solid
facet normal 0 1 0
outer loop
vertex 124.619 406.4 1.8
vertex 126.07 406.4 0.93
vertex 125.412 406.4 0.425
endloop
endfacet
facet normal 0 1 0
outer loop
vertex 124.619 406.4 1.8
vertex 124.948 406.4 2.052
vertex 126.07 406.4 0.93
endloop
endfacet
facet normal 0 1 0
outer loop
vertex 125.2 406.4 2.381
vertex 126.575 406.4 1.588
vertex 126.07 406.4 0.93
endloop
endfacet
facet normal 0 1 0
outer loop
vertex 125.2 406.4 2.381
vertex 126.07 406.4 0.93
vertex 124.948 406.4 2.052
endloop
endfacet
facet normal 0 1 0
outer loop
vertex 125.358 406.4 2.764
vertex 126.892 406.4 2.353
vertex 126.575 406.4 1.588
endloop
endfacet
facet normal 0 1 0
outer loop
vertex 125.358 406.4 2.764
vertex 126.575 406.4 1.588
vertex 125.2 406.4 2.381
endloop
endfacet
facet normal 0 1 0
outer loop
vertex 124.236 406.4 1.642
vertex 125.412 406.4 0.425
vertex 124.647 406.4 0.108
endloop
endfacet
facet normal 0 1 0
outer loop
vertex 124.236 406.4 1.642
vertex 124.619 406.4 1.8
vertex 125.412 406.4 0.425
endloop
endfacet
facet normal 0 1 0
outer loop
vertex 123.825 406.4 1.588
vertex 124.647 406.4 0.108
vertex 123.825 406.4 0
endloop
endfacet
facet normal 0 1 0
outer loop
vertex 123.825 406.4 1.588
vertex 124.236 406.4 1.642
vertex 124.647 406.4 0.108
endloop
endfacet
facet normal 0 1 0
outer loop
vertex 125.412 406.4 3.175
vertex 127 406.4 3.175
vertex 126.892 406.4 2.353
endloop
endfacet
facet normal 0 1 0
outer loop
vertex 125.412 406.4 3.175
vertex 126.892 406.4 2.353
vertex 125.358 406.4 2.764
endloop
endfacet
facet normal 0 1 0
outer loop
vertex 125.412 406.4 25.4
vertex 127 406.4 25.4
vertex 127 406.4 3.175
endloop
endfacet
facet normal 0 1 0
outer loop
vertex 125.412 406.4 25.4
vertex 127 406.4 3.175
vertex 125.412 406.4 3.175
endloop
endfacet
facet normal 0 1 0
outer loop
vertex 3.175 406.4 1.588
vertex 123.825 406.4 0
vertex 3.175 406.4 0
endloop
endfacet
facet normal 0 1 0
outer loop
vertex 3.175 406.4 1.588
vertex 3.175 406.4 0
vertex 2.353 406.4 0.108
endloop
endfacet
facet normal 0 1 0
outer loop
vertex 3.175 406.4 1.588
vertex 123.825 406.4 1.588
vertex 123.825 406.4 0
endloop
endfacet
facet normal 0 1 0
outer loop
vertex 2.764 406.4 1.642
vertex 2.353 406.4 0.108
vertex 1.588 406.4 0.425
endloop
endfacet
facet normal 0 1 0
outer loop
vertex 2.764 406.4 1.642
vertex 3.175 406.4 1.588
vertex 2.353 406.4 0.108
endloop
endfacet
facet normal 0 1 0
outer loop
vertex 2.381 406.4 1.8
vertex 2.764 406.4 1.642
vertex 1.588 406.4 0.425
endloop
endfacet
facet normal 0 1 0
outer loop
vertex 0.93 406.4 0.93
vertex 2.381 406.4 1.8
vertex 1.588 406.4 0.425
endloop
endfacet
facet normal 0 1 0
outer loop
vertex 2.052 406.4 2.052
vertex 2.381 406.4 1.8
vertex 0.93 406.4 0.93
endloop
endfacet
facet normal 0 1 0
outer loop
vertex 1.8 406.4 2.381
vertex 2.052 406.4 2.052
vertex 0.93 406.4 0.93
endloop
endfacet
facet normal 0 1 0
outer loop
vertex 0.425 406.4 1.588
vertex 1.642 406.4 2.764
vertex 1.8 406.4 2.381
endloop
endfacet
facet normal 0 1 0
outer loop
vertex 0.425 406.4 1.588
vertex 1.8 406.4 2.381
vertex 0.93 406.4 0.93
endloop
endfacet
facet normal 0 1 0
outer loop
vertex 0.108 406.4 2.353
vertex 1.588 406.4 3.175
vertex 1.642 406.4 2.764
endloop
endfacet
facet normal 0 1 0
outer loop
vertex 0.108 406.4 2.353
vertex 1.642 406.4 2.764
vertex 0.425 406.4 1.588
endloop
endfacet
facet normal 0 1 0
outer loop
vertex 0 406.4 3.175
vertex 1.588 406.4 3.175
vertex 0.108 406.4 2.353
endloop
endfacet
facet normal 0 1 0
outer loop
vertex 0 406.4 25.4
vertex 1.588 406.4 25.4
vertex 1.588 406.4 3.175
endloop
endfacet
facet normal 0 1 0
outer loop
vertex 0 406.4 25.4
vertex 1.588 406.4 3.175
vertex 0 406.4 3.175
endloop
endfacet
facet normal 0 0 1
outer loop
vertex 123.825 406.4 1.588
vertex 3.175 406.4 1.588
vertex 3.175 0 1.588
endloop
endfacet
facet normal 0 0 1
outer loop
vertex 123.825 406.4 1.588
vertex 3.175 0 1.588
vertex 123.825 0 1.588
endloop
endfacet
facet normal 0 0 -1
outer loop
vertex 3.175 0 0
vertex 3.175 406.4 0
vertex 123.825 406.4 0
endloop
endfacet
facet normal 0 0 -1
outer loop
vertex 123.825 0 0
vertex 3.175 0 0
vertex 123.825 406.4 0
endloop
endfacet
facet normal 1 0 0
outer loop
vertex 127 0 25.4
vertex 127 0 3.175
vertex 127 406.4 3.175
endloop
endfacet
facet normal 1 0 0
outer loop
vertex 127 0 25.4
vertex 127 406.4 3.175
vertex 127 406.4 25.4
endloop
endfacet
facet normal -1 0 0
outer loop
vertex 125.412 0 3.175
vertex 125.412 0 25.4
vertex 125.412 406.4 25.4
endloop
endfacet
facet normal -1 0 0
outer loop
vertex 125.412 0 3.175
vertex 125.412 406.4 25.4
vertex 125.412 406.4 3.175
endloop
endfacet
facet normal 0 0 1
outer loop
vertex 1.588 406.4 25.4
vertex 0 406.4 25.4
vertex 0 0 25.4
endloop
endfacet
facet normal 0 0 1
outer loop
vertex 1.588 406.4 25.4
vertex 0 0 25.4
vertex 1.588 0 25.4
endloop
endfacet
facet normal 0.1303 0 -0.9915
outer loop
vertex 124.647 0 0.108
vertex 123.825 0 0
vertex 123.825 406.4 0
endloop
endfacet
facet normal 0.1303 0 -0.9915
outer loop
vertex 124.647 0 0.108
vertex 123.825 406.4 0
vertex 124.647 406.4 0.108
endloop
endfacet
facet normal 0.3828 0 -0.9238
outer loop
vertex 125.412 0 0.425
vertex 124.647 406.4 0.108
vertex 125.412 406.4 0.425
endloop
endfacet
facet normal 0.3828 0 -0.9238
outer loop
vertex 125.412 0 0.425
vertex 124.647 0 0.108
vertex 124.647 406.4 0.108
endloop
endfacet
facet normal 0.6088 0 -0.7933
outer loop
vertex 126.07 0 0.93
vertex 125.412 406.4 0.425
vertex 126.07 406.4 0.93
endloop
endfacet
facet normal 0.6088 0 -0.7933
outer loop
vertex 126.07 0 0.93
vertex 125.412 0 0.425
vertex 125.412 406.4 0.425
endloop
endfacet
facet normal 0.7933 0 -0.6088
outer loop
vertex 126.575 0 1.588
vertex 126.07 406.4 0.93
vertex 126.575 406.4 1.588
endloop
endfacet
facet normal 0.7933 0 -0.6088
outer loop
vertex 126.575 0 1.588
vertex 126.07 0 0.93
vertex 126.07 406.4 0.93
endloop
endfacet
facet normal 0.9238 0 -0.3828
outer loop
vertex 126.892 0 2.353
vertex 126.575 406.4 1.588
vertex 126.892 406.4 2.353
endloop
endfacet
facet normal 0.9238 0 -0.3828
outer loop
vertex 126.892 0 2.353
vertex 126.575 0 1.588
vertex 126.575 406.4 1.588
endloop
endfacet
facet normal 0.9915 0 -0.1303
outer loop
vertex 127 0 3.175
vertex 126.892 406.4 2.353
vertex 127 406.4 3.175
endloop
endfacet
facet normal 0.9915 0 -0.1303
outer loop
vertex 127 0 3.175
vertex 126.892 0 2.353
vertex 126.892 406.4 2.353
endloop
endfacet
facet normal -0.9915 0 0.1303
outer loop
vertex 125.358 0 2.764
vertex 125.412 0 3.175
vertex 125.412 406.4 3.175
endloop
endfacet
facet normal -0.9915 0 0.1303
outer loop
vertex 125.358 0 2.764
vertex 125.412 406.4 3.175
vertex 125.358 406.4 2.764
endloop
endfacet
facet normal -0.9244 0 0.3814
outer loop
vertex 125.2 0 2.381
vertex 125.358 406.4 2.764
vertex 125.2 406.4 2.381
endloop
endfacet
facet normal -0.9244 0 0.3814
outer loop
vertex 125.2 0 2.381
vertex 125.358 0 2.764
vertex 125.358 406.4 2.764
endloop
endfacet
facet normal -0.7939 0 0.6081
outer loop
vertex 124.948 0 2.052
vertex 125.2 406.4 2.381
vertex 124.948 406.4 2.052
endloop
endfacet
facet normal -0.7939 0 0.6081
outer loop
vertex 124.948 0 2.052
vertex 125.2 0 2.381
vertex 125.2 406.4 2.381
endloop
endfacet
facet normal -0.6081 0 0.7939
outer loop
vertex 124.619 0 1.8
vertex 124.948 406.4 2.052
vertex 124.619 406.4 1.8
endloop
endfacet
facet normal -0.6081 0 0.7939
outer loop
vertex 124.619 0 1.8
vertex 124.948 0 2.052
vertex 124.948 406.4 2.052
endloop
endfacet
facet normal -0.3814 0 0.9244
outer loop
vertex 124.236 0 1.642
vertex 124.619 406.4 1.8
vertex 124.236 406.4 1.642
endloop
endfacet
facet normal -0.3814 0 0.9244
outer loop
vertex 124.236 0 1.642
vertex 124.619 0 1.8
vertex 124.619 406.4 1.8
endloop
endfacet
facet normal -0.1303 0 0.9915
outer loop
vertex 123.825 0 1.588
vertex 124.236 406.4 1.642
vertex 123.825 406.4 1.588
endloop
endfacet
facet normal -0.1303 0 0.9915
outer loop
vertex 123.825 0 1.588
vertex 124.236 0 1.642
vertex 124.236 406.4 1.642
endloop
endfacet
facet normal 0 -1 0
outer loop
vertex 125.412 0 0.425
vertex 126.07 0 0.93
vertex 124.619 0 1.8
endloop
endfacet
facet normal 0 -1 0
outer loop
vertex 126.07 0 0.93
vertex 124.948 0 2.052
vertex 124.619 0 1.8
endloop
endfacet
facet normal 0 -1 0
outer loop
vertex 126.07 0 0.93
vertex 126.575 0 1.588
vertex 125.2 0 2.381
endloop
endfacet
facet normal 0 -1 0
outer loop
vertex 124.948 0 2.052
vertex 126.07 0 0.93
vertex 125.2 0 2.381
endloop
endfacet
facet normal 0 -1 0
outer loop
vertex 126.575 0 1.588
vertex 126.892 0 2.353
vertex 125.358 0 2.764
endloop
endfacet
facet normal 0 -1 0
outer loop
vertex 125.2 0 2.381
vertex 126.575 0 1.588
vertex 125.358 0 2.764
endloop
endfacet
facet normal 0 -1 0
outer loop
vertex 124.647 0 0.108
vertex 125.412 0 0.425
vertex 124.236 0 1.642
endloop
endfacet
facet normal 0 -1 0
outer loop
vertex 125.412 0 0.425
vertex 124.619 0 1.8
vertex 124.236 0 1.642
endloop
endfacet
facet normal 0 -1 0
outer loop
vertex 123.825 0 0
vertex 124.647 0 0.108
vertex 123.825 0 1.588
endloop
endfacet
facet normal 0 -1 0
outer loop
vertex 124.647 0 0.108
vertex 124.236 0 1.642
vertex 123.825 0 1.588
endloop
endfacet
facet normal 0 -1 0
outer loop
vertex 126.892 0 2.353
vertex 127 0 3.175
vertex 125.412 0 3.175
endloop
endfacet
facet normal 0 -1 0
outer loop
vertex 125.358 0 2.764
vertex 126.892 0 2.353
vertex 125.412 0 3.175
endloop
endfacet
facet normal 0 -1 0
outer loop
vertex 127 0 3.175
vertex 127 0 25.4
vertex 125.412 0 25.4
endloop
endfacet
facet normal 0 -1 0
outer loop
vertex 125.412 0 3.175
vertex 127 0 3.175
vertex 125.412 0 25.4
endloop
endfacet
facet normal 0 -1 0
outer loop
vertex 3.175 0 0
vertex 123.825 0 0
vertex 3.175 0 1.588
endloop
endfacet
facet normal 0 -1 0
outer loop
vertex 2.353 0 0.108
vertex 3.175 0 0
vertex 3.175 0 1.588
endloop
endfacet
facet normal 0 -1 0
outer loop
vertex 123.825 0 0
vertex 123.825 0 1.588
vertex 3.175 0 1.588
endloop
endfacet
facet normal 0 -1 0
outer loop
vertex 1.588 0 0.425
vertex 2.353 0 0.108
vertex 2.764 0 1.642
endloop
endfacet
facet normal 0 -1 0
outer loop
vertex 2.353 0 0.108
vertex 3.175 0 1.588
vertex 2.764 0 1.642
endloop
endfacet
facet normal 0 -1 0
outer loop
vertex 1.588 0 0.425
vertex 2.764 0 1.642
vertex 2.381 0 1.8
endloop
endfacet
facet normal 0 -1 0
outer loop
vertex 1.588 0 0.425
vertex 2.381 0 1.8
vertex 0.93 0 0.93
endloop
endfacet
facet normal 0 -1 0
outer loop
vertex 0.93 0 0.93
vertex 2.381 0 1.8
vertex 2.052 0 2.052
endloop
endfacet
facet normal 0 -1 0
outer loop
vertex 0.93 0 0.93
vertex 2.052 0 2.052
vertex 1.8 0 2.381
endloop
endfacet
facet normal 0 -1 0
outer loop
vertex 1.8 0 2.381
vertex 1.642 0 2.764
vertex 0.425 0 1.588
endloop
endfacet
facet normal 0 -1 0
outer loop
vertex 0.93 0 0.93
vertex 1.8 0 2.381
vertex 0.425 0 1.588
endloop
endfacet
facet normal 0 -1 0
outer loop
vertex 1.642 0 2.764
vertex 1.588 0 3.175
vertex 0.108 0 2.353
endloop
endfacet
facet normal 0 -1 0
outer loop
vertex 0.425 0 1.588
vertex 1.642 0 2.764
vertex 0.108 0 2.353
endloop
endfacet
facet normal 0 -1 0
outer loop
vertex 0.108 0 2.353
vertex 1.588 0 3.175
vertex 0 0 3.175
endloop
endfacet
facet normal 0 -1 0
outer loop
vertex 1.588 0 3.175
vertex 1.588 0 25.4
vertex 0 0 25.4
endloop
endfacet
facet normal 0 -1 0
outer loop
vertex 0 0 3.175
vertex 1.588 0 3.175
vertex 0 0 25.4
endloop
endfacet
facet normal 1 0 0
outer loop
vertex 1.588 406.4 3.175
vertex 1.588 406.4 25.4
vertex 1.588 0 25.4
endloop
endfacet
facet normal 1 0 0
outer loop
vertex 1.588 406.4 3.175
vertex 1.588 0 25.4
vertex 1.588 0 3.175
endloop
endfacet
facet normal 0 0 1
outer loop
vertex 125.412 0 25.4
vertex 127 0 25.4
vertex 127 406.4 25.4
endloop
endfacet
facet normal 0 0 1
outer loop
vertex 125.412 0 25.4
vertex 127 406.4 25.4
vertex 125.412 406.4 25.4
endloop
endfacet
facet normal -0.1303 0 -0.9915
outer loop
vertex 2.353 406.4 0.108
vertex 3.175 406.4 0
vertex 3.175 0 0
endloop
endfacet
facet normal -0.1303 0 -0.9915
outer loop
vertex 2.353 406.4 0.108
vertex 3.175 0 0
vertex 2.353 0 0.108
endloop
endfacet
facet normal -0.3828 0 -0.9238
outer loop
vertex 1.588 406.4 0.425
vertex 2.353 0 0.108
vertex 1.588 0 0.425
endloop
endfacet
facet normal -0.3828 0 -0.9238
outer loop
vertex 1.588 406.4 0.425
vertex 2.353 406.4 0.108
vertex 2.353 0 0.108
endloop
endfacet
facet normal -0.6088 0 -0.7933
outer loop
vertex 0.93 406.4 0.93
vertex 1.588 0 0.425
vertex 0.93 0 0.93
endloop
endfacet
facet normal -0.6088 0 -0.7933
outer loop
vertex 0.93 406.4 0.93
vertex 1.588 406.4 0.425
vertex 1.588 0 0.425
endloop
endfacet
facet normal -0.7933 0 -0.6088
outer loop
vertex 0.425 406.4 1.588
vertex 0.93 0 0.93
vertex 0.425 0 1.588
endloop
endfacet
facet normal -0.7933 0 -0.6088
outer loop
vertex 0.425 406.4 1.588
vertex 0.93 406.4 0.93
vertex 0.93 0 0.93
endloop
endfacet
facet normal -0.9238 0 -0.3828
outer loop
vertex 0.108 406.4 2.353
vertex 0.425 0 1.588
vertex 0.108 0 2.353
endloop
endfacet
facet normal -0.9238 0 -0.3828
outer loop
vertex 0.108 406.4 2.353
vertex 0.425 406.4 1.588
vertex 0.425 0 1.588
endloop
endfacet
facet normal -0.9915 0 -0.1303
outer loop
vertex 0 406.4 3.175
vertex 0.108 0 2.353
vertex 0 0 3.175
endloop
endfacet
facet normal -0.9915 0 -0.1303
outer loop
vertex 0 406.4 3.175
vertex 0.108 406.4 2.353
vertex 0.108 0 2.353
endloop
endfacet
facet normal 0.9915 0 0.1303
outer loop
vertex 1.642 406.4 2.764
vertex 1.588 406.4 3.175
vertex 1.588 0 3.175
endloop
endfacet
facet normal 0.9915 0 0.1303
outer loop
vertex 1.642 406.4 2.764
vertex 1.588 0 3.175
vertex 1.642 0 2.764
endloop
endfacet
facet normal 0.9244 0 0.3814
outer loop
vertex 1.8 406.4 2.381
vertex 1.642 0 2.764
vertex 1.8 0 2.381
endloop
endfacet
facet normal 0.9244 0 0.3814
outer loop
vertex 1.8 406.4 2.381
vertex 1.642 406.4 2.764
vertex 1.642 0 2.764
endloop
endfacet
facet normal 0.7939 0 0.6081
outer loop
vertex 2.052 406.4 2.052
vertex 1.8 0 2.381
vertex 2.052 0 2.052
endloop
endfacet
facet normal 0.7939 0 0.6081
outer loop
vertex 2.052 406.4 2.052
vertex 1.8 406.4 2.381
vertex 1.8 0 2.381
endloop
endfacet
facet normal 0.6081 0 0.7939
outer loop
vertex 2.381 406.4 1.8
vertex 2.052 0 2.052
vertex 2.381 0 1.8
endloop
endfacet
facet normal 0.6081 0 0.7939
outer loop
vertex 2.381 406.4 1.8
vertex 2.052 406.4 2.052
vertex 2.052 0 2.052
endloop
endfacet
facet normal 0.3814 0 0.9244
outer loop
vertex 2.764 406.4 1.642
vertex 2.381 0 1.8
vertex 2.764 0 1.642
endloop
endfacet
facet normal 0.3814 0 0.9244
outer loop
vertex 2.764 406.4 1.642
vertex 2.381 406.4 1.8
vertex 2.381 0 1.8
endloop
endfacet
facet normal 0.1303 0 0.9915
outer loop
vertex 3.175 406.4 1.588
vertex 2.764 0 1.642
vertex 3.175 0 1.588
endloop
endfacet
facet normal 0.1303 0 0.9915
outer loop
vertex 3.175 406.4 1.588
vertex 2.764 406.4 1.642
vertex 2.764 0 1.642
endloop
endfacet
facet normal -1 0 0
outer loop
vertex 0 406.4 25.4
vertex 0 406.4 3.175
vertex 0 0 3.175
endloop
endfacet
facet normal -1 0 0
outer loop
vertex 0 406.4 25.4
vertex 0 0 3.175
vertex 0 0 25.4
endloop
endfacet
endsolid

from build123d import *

# Parameters (mm, degrees)
SKETCH1_W                      = 127
SKETCH1_H                      = 406.4
BOSS_EXTRUDE1_DEPTH            = 1.5875
EDGE_FLANGE1_STRIP_W           = 9.525
EDGE_FLANGE1_STRIP_H           = 1.5875
EDGE_FLANGE1_STRIP_CUT_DEPTH   = 406.4
EDGE_FLANGE1_STRIP_2_W         = 9.525
EDGE_FLANGE1_STRIP_2_H         = 1.5875
EDGE_FLANGE1_STRIP_CUT_2_DEPTH = 406.4
EDGE_FLANGE1_DEPTH             = 406.4
EDGE_FLANGE1_BEND_DEPTH        = 406.4


# Sheet-metal steps are written as plain solids
with BuildPart() as part:
    # Sketch1 → Boss-Extrude1 (new body)
    with BuildSketch(Plane.XY):
        with Locations((63.5, 203.2)):
            Rectangle(SKETCH1_W, SKETCH1_H)
    extrude(amount=BOSS_EXTRUDE1_DEPTH)

    # Edge-Flange1 strip (across the edge) → Edge-Flange1 strip cut (cut)
    with BuildSketch(Plane(origin=(127, 0, 1.5875), x_dir=(-1, 0, 0), z_dir=(0, 1, 0))):
        with Locations((-1.5875, -0.79375)):
            Rectangle(EDGE_FLANGE1_STRIP_W, EDGE_FLANGE1_STRIP_H)
    extrude(amount=EDGE_FLANGE1_STRIP_CUT_DEPTH, mode=Mode.SUBTRACT)

    # Edge-Flange1 strip 2 (across the edge) → Edge-Flange1 strip cut 2 (cut)
    with BuildSketch(Plane(origin=(0, 406.4, 1.5875), x_dir=(1, 0, 0), z_dir=(0, -1, 0))):
        with Locations((-1.5875, -0.79375)):
            Rectangle(EDGE_FLANGE1_STRIP_2_W, EDGE_FLANGE1_STRIP_2_H)
    extrude(amount=EDGE_FLANGE1_STRIP_CUT_2_DEPTH, mode=Mode.SUBTRACT)

    # Edge-Flange1 section (across the edge) → Edge-Flange1 (add)
    with BuildSketch(Plane(origin=(127, 0, 1.5875), x_dir=(-1, 0, 0), z_dir=(0, 1, 0))):
        with BuildLine():
            Line((0, 1.5875), (0, 23.8125))
            Line((0, 23.8125), (1.5875, 23.8125))
            Line((1.5875, 23.8125), (1.5875, 1.5875))
            ThreePointArc((1.5875, 1.5875), (2.052467985, 0.464967985), (3.175, 0))
            Line((3.175, 0), (3.175, -1.5875))
            ThreePointArc((3.175, -1.5875), (0.92993597, -0.65756403), (0, 1.5875))
        make_face()
    extrude(amount=EDGE_FLANGE1_DEPTH)

    # Edge-Flange1 section 2 (across the edge) → Edge-Flange1 bend (add)
    with BuildSketch(Plane(origin=(0, 406.4, 1.5875), x_dir=(1, 0, 0), z_dir=(0, -1, 0))):
        with BuildLine():
            Line((0, 1.5875), (0, 23.8125))
            Line((0, 23.8125), (1.5875, 23.8125))
            Line((1.5875, 23.8125), (1.5875, 1.5875))
            ThreePointArc((1.5875, 1.5875), (2.052467985, 0.464967985), (3.175, 0))
            Line((3.175, 0), (3.175, -1.5875))
            ThreePointArc((3.175, -1.5875), (0.92993597, -0.65756403), (0, 1.5875))
        make_face()
    extrude(amount=EDGE_FLANGE1_BEND_DEPTH)


solid = part.part
